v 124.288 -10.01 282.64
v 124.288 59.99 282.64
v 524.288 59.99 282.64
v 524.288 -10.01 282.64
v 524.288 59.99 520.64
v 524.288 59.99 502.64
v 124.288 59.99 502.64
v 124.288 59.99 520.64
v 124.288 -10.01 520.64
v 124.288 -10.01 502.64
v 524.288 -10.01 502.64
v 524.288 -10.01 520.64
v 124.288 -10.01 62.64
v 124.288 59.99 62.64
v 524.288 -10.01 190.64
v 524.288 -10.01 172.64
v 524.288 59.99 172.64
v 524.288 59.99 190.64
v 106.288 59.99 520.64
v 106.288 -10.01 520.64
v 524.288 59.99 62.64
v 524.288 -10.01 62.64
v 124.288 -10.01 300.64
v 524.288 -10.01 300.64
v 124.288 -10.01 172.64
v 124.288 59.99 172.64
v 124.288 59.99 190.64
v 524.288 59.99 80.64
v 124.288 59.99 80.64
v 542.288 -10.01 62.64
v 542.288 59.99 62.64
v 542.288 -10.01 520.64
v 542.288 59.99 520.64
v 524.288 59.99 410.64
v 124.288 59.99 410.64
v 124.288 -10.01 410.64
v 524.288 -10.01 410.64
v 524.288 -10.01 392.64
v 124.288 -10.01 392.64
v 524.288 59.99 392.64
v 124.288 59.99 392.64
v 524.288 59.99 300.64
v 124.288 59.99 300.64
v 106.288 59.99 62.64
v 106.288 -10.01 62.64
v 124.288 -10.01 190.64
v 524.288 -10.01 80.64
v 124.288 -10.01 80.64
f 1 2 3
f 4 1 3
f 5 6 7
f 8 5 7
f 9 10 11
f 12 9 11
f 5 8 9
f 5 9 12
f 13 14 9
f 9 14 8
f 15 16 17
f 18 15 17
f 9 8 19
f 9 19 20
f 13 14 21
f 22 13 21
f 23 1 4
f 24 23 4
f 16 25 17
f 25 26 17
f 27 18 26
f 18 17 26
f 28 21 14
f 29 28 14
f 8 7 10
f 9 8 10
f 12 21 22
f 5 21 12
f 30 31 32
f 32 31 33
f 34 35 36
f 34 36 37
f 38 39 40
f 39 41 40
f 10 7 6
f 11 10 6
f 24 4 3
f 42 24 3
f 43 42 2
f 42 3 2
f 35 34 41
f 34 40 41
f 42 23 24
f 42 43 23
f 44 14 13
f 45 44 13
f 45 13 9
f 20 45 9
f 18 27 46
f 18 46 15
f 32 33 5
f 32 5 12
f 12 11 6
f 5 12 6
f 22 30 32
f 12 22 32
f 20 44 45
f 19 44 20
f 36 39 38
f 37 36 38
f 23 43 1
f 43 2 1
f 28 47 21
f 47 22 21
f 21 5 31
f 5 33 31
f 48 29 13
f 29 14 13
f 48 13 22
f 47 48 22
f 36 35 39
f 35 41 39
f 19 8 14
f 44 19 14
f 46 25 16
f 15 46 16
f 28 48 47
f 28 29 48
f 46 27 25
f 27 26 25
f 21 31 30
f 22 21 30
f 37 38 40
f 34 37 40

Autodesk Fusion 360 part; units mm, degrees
sketch "Sketch1" plane through (0, 0, 0) normal (0, 0, 1) x (1, 0, 0) in component "Base"
  line L0 (0, 0) -> (400, 0)
  line L1 (400, 0) -> (400, 70)
  line L2 (400, 70) -> (0, 70)
  line L3 (0, 70) -> (0, 0)
  dimension "d5" = 400
  dimension "d6" = 70
extrude "Extrude1" add sketch "Sketch1" along normal blind 18 makes body 1 in component "Base"
sketch "Sketch1 (2)" plane through (0, 0, 0) normal (-1, 0, 0) x (0, 0, 1) in component "wall"
  line L0 (0, 70) -> (0, 0)
  line L1 (0, 0) -> (18, 0)
  line L2 (18, 0) -> (18, 70)
  line L3 (18, 70) -> (0, 70)
  line L4 (0, 70) -> (458, 70)
  line L5 (458, 70) -> (458, 0)
  line L6 (458, 0) -> (0, 0)
  line L7 (0, 0) -> (0, 70)
  dimension "d10" = 458
extrude "Extrude1'" add sketch "Sketch1 (2)" along normal blind 18 separate body makes body 2 in component "wall"
pattern_linear "00000000-0000-0000-0000-000000000000" [suppressed]
component "Base" placed x (1, 0, 0) y (0, 1, 0) z (0, 0, 1) at (124.288, -10.0095, 62.6397)
component "wall" placed x (1, 0, 0) y (0, 1, 0) z (0, 0, 1) at (124.288, -10.0095, 62.6397)
component "wall" placed x (1, 0, 0) y (0, 1, 0) z (0, 0, 1) at (542.288, -10.0095, 62.6397)
component "Base" placed x (1, 0, 0) y (0, 1, 0) z (0, 0, 1) at (124.288, -10.0095, 502.6397)
component "Base" placed x (1, 0, 0) y (0, 1, 0) z (0, 0, 1) at (124.288, -10.0095, 172.6397)
component "Base" placed x (1, 0, 0) y (0, 1, 0) z (0, 0, 1) at (124.288, -10.0095, 282.6397)
component "Base" placed x (1, 0, 0) y (0, 1, 0) z (0, 0, 1) at (124.288, -10.0095, 392.6397)
equation "shelf_depth = 70.00 mm"
equation "shelf_width = 400.00 mm"
equation "shelfs_number = 4"
equation "shelf_height = 92.00 mm"
equation "d5 = shelf_width"
equation "d6 = shelf_depth"
equation "board_thickness = 18.00 mm"
equation "d8 = board_thickness"
equation "d10 = shelfs_number * ( board_thickness + shelf_height ) + board_thickness"
equation "d11 = board_thickness"
equation "d25 = shelfs_number"
equation "d27 = shelf_height + board_thickness"
